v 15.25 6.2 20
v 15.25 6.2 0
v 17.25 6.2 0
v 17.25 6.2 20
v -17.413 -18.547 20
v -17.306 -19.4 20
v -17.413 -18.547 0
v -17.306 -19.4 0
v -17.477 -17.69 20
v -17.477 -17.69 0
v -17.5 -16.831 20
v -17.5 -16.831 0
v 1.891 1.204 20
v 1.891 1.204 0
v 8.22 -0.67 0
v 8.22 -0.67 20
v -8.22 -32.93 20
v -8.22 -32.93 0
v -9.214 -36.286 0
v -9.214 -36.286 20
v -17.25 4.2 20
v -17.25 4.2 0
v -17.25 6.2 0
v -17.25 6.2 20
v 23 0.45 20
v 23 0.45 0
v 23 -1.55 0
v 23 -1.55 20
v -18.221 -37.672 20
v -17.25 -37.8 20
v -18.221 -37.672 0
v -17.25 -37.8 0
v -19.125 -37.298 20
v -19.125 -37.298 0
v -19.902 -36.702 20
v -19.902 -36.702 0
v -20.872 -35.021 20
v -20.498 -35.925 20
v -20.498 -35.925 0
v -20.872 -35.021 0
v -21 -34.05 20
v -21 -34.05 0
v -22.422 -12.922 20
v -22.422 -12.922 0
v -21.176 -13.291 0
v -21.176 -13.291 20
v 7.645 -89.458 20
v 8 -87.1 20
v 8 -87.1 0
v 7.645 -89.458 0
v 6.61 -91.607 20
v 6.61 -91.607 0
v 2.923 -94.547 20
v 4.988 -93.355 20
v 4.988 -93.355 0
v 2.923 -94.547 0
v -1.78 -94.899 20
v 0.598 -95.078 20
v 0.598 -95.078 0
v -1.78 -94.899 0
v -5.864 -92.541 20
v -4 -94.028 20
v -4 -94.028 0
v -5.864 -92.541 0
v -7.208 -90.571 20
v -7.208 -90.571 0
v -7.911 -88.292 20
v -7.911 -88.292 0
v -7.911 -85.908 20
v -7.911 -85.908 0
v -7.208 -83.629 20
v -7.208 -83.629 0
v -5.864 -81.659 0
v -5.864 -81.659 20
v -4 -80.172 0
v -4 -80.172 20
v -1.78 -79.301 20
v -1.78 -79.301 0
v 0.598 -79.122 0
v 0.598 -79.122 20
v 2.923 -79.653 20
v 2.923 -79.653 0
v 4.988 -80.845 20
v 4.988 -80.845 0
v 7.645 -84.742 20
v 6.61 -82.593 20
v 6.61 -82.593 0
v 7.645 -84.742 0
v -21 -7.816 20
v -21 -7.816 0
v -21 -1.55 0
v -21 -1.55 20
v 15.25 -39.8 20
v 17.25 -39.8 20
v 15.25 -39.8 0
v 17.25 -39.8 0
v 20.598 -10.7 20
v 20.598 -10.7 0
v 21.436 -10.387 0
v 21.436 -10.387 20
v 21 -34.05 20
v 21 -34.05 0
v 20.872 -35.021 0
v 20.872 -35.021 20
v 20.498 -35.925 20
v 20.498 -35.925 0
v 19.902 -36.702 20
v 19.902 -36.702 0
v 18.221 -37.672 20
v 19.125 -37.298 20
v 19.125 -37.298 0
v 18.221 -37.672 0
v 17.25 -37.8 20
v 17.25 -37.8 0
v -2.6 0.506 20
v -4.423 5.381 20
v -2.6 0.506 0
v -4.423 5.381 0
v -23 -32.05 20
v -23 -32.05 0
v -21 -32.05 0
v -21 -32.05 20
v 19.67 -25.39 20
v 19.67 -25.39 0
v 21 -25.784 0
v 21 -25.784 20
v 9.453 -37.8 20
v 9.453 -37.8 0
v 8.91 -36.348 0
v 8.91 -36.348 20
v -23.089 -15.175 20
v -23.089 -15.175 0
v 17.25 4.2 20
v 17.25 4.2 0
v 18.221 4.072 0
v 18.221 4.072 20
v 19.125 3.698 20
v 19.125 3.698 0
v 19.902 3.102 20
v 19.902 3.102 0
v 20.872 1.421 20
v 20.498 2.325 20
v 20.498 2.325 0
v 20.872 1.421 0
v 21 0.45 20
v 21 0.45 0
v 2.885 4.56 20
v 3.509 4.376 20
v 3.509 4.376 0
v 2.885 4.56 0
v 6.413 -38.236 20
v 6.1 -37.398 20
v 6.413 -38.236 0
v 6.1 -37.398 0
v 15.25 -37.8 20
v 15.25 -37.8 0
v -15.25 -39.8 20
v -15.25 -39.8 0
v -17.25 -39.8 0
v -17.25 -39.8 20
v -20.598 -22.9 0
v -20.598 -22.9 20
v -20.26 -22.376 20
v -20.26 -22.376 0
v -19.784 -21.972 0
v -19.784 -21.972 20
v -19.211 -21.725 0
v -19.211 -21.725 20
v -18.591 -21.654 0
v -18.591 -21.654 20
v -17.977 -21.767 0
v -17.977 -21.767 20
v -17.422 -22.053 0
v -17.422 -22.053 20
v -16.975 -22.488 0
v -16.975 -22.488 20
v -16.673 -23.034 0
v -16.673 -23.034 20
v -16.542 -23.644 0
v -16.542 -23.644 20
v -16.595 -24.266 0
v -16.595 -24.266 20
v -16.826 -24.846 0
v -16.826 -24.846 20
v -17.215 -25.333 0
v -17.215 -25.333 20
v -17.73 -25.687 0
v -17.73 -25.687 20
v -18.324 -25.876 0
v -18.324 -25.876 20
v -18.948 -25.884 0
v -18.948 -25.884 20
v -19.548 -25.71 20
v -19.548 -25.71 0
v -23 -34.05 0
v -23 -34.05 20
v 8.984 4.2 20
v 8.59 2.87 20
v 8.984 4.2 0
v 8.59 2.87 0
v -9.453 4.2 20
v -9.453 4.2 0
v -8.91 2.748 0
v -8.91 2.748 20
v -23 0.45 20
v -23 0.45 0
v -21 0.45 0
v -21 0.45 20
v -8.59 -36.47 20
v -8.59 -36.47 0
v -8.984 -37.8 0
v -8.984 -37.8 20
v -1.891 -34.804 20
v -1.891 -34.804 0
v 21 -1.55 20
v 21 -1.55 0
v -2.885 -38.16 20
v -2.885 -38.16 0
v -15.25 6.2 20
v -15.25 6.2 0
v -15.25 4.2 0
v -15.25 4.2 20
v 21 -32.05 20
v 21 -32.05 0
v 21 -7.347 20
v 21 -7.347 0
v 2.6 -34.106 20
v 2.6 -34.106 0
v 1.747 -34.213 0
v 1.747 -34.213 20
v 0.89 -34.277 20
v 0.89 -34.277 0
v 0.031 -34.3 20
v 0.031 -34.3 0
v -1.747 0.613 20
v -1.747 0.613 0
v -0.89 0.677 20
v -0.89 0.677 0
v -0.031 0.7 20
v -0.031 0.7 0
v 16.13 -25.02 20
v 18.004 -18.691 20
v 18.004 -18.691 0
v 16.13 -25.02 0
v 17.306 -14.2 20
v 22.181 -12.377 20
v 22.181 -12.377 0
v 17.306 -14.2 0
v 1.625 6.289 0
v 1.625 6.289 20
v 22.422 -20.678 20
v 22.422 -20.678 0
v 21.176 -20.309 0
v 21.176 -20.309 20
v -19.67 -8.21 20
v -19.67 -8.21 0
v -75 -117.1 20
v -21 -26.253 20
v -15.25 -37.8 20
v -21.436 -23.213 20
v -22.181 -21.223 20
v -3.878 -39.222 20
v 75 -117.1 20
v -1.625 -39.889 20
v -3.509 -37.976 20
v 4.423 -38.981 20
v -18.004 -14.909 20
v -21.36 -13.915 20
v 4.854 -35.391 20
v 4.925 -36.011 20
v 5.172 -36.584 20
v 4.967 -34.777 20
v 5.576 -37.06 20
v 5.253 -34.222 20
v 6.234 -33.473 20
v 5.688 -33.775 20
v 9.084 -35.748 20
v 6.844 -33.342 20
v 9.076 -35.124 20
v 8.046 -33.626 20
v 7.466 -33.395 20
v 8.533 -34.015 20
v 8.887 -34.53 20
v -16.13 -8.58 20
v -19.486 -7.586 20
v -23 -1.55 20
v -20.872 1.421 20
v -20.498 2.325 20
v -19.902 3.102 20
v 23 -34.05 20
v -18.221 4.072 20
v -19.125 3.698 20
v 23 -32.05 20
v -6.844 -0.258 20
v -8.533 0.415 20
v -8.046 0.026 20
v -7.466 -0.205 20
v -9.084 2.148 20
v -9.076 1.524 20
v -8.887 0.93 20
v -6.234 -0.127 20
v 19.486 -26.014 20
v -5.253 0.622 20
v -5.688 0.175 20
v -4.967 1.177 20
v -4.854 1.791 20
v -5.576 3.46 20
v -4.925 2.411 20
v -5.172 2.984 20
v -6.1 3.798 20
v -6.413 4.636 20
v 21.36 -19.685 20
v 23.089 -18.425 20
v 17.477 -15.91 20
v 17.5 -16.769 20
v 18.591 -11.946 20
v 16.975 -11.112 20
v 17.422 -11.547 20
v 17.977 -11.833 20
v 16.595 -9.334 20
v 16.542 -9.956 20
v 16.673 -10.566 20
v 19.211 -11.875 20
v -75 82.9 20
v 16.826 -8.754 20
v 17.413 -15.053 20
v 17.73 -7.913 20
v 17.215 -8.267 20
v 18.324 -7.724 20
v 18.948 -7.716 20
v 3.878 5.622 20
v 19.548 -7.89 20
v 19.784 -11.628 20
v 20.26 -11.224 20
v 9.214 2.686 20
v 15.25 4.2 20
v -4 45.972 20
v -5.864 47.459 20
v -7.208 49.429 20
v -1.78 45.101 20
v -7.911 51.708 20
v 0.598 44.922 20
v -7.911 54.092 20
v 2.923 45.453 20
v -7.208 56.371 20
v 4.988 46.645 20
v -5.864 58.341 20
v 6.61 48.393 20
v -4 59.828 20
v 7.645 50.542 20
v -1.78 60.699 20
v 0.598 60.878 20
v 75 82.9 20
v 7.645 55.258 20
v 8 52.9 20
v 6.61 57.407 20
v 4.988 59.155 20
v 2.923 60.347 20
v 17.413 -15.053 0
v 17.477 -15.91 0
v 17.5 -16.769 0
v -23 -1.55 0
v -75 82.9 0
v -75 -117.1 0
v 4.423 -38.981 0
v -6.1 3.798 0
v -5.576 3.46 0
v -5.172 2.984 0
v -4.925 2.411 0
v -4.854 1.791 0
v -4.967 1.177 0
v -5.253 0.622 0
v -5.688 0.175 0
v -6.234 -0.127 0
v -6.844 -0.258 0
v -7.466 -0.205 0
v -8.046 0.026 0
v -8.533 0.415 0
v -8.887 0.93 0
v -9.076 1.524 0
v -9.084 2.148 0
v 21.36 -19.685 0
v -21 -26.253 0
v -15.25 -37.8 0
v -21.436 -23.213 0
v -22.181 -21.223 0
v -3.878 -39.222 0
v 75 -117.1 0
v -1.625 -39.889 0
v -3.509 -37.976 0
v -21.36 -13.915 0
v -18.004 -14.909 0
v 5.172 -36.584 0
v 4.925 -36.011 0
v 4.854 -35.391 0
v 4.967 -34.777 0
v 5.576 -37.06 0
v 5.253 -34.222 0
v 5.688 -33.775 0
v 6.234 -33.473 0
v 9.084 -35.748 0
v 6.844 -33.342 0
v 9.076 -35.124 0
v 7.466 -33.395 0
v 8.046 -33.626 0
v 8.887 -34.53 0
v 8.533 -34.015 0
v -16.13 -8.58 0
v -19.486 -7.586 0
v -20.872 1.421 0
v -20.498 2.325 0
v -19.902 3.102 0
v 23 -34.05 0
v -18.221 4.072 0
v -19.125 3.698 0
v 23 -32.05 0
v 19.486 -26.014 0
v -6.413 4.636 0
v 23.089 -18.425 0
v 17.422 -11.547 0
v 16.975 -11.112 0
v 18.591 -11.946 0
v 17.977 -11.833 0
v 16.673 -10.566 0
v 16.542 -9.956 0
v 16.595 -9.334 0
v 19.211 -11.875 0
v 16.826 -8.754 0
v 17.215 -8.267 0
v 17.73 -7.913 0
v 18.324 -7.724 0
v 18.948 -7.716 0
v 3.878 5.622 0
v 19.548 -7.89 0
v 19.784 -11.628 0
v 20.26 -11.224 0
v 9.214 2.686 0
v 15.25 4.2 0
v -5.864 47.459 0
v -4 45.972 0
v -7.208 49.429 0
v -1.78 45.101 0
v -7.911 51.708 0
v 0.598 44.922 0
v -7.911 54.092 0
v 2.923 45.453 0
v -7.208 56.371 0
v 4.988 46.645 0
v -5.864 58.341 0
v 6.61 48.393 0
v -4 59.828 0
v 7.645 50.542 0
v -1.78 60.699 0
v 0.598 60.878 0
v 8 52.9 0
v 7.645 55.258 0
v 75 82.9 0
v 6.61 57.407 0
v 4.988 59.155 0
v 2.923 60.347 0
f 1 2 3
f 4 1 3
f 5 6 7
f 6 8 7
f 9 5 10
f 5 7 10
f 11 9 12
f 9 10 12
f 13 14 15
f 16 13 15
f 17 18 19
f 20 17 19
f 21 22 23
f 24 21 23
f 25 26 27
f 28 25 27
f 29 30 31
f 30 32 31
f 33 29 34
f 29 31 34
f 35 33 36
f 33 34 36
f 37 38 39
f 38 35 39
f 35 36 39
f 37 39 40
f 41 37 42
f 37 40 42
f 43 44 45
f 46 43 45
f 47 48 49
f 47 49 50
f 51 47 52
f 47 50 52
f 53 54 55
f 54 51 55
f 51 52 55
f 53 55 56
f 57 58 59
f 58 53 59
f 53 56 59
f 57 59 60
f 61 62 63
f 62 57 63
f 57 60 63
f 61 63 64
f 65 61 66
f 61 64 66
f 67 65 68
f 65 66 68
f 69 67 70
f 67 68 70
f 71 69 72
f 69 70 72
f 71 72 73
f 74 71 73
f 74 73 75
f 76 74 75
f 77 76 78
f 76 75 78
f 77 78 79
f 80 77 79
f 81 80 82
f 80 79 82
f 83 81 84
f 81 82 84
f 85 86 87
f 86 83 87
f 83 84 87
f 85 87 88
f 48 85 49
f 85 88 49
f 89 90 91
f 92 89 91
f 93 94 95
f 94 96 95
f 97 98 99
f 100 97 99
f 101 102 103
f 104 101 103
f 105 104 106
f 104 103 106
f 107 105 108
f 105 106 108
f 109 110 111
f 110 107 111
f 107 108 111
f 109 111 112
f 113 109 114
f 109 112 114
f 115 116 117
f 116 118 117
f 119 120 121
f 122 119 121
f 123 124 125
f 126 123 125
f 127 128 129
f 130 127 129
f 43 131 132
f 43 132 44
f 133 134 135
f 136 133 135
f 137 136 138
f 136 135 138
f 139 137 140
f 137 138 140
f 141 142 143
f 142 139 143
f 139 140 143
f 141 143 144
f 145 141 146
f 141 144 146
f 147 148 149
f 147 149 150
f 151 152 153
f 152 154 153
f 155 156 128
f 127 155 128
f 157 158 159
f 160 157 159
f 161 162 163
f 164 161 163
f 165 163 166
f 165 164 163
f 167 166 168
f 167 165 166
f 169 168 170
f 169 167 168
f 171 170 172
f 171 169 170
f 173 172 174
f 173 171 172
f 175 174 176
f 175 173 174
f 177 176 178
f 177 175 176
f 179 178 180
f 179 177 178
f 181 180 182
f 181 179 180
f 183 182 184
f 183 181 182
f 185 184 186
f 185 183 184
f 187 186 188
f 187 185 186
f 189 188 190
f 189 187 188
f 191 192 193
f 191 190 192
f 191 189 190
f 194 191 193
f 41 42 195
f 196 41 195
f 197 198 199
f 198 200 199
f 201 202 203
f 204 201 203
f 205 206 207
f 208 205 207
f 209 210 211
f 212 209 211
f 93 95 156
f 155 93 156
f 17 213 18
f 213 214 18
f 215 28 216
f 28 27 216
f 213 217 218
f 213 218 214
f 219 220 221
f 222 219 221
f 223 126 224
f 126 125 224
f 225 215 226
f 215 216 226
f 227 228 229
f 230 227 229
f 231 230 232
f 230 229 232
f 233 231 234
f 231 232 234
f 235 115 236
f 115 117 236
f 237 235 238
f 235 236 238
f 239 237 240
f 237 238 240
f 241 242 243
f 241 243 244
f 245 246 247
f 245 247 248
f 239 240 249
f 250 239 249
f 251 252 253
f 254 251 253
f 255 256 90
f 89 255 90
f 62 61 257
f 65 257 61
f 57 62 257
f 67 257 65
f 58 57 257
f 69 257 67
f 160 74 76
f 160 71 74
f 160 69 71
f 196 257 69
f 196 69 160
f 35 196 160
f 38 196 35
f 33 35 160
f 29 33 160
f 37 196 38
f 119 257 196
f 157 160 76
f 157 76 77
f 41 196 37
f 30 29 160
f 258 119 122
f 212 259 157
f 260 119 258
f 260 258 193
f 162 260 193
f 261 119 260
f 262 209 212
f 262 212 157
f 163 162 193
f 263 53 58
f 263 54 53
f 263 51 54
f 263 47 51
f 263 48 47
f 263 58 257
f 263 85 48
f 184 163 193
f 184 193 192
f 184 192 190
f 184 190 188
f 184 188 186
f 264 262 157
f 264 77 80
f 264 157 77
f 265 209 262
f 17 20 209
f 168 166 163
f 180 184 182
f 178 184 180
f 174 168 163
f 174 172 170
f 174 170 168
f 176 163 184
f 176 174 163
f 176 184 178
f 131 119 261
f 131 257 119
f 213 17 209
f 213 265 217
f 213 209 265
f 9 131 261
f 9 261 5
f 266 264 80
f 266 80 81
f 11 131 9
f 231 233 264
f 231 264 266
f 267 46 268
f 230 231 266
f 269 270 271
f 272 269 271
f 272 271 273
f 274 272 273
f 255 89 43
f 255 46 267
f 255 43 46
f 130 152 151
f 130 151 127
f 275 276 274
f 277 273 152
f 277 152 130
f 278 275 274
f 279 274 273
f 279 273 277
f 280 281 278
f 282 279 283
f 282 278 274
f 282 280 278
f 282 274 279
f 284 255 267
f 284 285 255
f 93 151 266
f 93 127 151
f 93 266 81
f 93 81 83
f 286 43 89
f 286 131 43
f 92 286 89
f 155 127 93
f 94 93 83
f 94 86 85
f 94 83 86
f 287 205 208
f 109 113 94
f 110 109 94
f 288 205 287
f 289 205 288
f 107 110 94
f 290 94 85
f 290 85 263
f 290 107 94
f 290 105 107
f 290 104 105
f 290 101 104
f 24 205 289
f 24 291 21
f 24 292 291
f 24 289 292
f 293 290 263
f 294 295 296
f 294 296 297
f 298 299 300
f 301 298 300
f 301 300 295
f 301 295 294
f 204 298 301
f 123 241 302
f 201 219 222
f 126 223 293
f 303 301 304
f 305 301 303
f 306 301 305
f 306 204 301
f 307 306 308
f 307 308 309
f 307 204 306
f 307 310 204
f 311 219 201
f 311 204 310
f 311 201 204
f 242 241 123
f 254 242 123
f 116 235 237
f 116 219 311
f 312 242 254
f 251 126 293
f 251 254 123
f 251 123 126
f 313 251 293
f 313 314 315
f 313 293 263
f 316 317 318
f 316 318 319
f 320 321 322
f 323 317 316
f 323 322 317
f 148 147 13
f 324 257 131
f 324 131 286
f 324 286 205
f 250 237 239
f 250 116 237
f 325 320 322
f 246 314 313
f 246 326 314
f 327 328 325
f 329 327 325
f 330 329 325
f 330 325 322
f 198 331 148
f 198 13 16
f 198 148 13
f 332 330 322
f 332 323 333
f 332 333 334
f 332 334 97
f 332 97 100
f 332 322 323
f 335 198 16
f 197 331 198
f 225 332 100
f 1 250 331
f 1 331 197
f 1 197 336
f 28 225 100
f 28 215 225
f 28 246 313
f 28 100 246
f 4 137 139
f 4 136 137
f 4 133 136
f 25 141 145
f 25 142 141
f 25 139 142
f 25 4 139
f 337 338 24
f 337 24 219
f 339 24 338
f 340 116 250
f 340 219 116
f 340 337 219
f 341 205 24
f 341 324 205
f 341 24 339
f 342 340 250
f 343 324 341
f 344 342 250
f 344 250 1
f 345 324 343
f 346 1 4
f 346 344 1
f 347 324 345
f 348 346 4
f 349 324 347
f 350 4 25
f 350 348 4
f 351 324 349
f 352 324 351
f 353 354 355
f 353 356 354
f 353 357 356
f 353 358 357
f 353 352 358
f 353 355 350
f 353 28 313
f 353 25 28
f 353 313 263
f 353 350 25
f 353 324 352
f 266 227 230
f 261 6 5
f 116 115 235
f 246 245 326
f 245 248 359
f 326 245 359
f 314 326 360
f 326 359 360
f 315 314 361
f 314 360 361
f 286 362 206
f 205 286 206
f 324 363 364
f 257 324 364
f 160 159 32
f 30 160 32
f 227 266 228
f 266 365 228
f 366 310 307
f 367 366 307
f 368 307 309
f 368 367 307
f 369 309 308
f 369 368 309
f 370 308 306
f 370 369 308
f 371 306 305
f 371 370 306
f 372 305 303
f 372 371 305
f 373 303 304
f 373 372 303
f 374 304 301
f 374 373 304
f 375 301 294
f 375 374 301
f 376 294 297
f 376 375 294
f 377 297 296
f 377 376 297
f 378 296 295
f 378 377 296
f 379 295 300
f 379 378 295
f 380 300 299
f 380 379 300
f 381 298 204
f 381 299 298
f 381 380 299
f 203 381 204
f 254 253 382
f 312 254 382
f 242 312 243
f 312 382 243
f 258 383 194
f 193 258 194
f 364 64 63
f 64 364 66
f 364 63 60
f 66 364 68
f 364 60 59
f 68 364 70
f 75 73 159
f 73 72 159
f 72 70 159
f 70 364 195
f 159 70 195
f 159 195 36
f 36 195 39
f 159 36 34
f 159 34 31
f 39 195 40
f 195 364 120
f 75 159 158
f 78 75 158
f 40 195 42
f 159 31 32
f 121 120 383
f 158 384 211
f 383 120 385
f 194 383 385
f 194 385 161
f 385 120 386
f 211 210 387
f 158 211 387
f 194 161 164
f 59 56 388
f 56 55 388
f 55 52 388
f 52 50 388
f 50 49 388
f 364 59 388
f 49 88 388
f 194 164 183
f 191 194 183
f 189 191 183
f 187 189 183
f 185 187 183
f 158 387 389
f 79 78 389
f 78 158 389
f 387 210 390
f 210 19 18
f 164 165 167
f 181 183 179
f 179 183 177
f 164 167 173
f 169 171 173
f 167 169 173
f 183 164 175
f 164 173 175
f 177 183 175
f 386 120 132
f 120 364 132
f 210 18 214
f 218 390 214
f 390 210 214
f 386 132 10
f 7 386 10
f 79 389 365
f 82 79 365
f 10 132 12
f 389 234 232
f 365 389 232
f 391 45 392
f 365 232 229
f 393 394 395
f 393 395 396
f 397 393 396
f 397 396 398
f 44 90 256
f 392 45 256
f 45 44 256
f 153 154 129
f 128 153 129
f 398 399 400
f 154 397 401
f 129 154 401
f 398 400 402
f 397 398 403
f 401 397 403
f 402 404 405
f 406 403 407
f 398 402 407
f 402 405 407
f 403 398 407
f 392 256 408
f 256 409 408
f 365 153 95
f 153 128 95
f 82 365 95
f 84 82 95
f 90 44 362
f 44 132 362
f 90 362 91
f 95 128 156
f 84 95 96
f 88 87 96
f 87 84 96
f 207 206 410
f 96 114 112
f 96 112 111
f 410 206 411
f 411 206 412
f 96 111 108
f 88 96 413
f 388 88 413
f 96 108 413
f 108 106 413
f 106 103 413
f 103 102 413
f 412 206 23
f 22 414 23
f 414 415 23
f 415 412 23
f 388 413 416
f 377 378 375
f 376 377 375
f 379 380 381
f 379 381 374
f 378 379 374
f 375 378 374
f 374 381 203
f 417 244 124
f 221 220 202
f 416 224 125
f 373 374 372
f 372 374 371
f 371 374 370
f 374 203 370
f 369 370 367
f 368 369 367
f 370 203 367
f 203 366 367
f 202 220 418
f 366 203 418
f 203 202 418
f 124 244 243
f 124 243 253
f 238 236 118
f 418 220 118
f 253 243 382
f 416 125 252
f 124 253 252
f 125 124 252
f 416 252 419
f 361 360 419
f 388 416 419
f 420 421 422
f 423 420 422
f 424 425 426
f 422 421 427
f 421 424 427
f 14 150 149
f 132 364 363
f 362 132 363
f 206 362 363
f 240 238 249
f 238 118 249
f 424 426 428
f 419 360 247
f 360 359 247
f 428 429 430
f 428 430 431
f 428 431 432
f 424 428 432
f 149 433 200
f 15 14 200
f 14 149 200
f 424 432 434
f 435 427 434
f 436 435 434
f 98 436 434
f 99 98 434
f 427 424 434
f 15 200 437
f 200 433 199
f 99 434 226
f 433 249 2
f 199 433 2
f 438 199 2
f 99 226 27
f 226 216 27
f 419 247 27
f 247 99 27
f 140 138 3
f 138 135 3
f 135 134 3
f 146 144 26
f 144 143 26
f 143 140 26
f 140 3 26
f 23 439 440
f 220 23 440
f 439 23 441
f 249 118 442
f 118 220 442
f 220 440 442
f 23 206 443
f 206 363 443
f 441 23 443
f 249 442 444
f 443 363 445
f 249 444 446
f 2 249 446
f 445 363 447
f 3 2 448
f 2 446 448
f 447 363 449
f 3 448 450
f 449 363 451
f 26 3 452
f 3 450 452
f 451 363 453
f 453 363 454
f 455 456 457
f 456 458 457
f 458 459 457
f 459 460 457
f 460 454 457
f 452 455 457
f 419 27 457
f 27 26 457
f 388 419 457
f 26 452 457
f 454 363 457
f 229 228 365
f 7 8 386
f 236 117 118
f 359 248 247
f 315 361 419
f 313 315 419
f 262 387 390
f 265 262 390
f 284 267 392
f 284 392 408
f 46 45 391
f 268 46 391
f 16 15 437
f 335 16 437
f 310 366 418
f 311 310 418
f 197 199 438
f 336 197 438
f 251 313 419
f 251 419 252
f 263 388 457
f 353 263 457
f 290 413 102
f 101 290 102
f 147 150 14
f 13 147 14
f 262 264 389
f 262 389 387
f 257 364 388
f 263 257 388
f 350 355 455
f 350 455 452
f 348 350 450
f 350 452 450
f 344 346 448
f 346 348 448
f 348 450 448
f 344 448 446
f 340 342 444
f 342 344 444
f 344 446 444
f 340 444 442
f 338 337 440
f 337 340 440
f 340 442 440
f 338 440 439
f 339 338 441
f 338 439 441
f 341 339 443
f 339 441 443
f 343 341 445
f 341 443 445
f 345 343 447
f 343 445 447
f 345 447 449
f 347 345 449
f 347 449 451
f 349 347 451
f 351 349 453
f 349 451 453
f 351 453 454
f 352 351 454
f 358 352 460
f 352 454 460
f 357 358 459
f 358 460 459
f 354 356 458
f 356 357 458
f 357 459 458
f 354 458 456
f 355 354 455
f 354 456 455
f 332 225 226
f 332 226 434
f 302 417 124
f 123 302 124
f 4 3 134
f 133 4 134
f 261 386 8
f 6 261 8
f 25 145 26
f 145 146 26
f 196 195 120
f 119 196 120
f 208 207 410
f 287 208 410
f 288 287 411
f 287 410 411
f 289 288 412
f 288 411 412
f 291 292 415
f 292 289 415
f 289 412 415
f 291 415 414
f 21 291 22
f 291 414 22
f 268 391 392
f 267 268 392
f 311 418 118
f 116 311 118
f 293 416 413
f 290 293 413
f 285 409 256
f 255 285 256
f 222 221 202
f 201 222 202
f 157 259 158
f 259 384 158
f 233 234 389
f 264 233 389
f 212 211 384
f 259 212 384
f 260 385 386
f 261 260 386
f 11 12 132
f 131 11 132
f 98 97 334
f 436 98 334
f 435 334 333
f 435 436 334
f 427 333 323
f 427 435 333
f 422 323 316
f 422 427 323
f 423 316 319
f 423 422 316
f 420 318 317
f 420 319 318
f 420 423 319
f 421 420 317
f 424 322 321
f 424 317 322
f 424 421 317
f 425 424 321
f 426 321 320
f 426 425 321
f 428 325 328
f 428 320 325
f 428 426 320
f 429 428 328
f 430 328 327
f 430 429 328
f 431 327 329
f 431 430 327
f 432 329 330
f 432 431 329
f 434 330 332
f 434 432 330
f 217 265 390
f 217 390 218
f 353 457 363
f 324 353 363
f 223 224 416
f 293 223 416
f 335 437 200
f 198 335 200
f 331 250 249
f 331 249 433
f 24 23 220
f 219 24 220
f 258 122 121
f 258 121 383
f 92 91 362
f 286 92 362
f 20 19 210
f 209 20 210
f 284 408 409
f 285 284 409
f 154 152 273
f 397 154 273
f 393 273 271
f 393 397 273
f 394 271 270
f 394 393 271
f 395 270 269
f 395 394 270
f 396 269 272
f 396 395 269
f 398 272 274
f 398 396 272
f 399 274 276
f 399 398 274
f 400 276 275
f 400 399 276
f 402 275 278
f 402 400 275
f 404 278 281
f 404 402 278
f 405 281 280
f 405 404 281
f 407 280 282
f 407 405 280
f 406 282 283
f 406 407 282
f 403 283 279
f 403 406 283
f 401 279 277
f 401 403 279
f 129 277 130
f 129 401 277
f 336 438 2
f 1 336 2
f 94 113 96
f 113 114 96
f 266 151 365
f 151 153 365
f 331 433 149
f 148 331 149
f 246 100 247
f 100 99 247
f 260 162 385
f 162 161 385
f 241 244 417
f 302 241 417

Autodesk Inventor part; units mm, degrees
ref_plane "YZ Plane" through (0, 0, 0) normal (1, 0, 0) x (0, 1, 0)
ref_plane "XZ Plane" through (0, 0, 0) normal (0, 1, 0) x (-1, 0, 0)
ref_plane "XY Plane" through (0, 0, 0) normal (0, 0, 1) x (1, 0, 0)
ref_plane "Work Plane1" through (0, 0, 0) normal (0, 0, 1) x (1, 0, 0)
sketch "Sketch1" plane through (0, 0, 0) normal (0, 0, 1) x (1, 0, 0)
  circle A0 centre (0, 52.9) radius 8 projected
  line L0 (-75, -117.1) -> (75, -117.1) projected
  line L1 (75, -117.1) -> (75, 82.9) projected
  line L2 (75, 82.9) -> (-75, 82.9) projected
  line L3 (-75, 82.9) -> (-75, -117.1) projected
  circle A1 centre (0, -87.1) radius 8 projected
  circle A2 centre (0, -16.8) radius 16
  line L4 (0.031, -34.3) -> (-1.6246, -39.8894)
  line L5 (-1.6246, -39.8894) -> (-3.8779, -39.222)
  line L6 (-3.8779, -39.222) -> (-3.5087, -37.9755)
  line L7 (-3.5087, -37.9755) -> (-2.8854, -38.1601)
  line L8 (-2.8854, -38.1601) -> (-1.8914, -34.8042)
  line L9 (-1.8914, -34.8042) -> (-8.2196, -32.9297)
  line L10 (-8.2196, -32.9297) -> (-9.2136, -36.2856)
  line L11 (-9.2136, -36.2856) -> (-8.5904, -36.4702)
  line L12 (-8.5904, -36.4702) -> (-8.9843, -37.8)
  line L13 (-8.9843, -37.8) -> (-15.25, -37.8)
  line L14 (-15.25, -37.8) -> (-15.25, -39.8)
  line L15 (-15.25, -39.8) -> (-17.25, -39.8)
  line L16 (-17.25, -39.8) -> (-17.25, -37.8)
  arc A3 (-21, -34.05) -> (-17.25, -37.8) centre (-17.25, -34.05) ccw
  line L17 (-21, -34.05) -> (-23, -34.05)
  line L18 (-23, -34.05) -> (-23, -32.05)
  line L19 (-23, -32.05) -> (-21, -32.05)
  line L20 (-21, -32.05) -> (-21, -26.253)
  line L21 (-21, -26.253) -> (-19.5478, -25.71)
  arc A4 (-19.5478, -25.71) -> (-20.5984, -22.9) centre (-18.6632, -23.7779) ccw
  line L22 (-20.5984, -22.9) -> (-21.4365, -23.2134)
  line L23 (-21.4365, -23.2134) -> (-22.1807, -21.2229)
  line L24 (-22.1807, -21.2229) -> (-17.3057, -19.4003)
  arc A5 (-17.5, -16.831) -> (-17.3057, -19.4003) centre (0, -16.8) ccw
  line L25 (-17.5, -16.831) -> (-23.0894, -15.1754)
  line L26 (-23.0894, -15.1754) -> (-22.422, -12.9221)
  line L27 (-22.422, -12.9221) -> (-21.1755, -13.2913)
  line L28 (-21.1755, -13.2913) -> (-21.3601, -13.9146)
  line L29 (-21.3601, -13.9146) -> (-18.0042, -14.9086)
  line L30 (-18.0042, -14.9086) -> (-16.1297, -8.5804)
  line L31 (-16.1297, -8.5804) -> (-19.4856, -7.5864)
  line L32 (-19.4856, -7.5864) -> (-19.6702, -8.2096)
  line L33 (-19.6702, -8.2096) -> (-21, -7.8157)
  line L34 (-21, -7.8157) -> (-21, -1.55)
  line L35 (-21, -1.55) -> (-23, -1.55)
  line L36 (-23, -1.55) -> (-23, 0.45)
  line L37 (-23, 0.45) -> (-21, 0.45)
  arc A6 (-17.25, 4.2) -> (-21, 0.45) centre (-17.25, 0.45) ccw
  line L38 (-17.25, 4.2) -> (-17.25, 6.2)
  line L39 (-17.25, 6.2) -> (-15.25, 6.2)
  line L40 (-15.25, 6.2) -> (-15.25, 4.2)
  line L41 (-15.25, 4.2) -> (-9.453, 4.2)
  line L42 (-9.453, 4.2) -> (-8.91, 2.7478)
  arc A7 (-8.91, 2.7478) -> (-6.1, 3.7984) centre (-6.9779, 1.8632) ccw
  line L43 (-6.1, 3.7984) -> (-6.4134, 4.6365)
  line L44 (-6.4134, 4.6365) -> (-4.4229, 5.3807)
  line L45 (-4.4229, 5.3807) -> (-2.6003, 0.5057)
  arc A8 (-0.031, 0.7) -> (-2.6003, 0.5057) centre (0, -16.8) ccw
  line L46 (-0.031, 0.7) -> (1.6246, 6.2894)
  line L47 (1.6246, 6.2894) -> (3.8779, 5.622)
  line L48 (3.8779, 5.622) -> (3.5087, 4.3755)
  line L49 (3.5087, 4.3755) -> (2.8854, 4.5601)
  line L50 (2.8854, 4.5601) -> (1.8914, 1.2042)
  line L51 (1.8914, 1.2042) -> (8.2196, -0.6703)
  line L52 (8.2196, -0.6703) -> (9.2136, 2.6856)
  line L53 (9.2136, 2.6856) -> (8.5904, 2.8702)
  line L54 (8.5904, 2.8702) -> (8.9843, 4.2)
  line L55 (8.9843, 4.2) -> (15.25, 4.2)
  line L56 (15.25, 4.2) -> (15.25, 6.2)
  line L57 (15.25, 6.2) -> (17.25, 6.2)
  line L58 (17.25, 6.2) -> (17.25, 4.2)
  arc A9 (21, 0.45) -> (17.25, 4.2) centre (17.25, 0.45) ccw
  line L59 (21, 0.45) -> (23, 0.45)
  line L60 (23, 0.45) -> (23, -1.55)
  line L61 (23, -1.55) -> (21, -1.55)
  line L62 (21, -1.55) -> (21, -7.347)
  line L63 (21, -7.347) -> (19.5478, -7.89)
  arc A10 (19.5478, -7.89) -> (20.5984, -10.7) centre (18.6632, -9.8221) ccw
  line L64 (20.5984, -10.7) -> (21.4365, -10.3866)
  line L65 (21.4365, -10.3866) -> (22.1807, -12.3771)
  line L66 (22.1807, -12.3771) -> (17.3057, -14.1997)
  arc A11 (17.5, -16.769) -> (17.3057, -14.1997) centre (0, -16.8) ccw
  line L67 (17.5, -16.769) -> (23.0894, -18.4246)
  line L68 (23.0894, -18.4246) -> (22.422, -20.6779)
  line L69 (22.422, -20.6779) -> (21.1755, -20.3087)
  line L70 (21.1755, -20.3087) -> (21.3601, -19.6854)
  line L71 (21.3601, -19.6854) -> (18.0042, -18.6914)
  line L72 (18.0042, -18.6914) -> (16.1297, -25.0196)
  line L73 (16.1297, -25.0196) -> (19.4856, -26.0136)
  line L74 (19.4856, -26.0136) -> (19.6702, -25.3904)
  line L75 (19.6702, -25.3904) -> (21, -25.7843)
  line L76 (21, -25.7843) -> (21, -32.05)
  line L77 (21, -32.05) -> (23, -32.05)
  line L78 (23, -32.05) -> (23, -34.05)
  line L79 (23, -34.05) -> (21, -34.05)
  arc A12 (17.25, -37.8) -> (21, -34.05) centre (17.25, -34.05) ccw
  line L80 (17.25, -37.8) -> (17.25, -39.8)
  line L81 (17.25, -39.8) -> (15.25, -39.8)
  line L82 (15.25, -39.8) -> (15.25, -37.8)
  line L83 (15.25, -37.8) -> (9.453, -37.8)
  line L84 (9.453, -37.8) -> (8.91, -36.3478)
  arc A13 (8.91, -36.3478) -> (6.1, -37.3984) centre (6.9779, -35.4632) ccw
  line L85 (6.1, -37.3984) -> (6.4134, -38.2365)
  line L86 (6.4134, -38.2365) -> (4.4229, -38.9807)
  line L87 (4.4229, -38.9807) -> (2.6003, -34.1057)
  arc A14 (0.031, -34.3) -> (2.6003, -34.1057) centre (0, -16.8) ccw
extrude "Extrusion1" add sketch "Sketch1" along normal blind 20 contours L3 L2 L1 L0
properties part number "Soporte Pistón"
